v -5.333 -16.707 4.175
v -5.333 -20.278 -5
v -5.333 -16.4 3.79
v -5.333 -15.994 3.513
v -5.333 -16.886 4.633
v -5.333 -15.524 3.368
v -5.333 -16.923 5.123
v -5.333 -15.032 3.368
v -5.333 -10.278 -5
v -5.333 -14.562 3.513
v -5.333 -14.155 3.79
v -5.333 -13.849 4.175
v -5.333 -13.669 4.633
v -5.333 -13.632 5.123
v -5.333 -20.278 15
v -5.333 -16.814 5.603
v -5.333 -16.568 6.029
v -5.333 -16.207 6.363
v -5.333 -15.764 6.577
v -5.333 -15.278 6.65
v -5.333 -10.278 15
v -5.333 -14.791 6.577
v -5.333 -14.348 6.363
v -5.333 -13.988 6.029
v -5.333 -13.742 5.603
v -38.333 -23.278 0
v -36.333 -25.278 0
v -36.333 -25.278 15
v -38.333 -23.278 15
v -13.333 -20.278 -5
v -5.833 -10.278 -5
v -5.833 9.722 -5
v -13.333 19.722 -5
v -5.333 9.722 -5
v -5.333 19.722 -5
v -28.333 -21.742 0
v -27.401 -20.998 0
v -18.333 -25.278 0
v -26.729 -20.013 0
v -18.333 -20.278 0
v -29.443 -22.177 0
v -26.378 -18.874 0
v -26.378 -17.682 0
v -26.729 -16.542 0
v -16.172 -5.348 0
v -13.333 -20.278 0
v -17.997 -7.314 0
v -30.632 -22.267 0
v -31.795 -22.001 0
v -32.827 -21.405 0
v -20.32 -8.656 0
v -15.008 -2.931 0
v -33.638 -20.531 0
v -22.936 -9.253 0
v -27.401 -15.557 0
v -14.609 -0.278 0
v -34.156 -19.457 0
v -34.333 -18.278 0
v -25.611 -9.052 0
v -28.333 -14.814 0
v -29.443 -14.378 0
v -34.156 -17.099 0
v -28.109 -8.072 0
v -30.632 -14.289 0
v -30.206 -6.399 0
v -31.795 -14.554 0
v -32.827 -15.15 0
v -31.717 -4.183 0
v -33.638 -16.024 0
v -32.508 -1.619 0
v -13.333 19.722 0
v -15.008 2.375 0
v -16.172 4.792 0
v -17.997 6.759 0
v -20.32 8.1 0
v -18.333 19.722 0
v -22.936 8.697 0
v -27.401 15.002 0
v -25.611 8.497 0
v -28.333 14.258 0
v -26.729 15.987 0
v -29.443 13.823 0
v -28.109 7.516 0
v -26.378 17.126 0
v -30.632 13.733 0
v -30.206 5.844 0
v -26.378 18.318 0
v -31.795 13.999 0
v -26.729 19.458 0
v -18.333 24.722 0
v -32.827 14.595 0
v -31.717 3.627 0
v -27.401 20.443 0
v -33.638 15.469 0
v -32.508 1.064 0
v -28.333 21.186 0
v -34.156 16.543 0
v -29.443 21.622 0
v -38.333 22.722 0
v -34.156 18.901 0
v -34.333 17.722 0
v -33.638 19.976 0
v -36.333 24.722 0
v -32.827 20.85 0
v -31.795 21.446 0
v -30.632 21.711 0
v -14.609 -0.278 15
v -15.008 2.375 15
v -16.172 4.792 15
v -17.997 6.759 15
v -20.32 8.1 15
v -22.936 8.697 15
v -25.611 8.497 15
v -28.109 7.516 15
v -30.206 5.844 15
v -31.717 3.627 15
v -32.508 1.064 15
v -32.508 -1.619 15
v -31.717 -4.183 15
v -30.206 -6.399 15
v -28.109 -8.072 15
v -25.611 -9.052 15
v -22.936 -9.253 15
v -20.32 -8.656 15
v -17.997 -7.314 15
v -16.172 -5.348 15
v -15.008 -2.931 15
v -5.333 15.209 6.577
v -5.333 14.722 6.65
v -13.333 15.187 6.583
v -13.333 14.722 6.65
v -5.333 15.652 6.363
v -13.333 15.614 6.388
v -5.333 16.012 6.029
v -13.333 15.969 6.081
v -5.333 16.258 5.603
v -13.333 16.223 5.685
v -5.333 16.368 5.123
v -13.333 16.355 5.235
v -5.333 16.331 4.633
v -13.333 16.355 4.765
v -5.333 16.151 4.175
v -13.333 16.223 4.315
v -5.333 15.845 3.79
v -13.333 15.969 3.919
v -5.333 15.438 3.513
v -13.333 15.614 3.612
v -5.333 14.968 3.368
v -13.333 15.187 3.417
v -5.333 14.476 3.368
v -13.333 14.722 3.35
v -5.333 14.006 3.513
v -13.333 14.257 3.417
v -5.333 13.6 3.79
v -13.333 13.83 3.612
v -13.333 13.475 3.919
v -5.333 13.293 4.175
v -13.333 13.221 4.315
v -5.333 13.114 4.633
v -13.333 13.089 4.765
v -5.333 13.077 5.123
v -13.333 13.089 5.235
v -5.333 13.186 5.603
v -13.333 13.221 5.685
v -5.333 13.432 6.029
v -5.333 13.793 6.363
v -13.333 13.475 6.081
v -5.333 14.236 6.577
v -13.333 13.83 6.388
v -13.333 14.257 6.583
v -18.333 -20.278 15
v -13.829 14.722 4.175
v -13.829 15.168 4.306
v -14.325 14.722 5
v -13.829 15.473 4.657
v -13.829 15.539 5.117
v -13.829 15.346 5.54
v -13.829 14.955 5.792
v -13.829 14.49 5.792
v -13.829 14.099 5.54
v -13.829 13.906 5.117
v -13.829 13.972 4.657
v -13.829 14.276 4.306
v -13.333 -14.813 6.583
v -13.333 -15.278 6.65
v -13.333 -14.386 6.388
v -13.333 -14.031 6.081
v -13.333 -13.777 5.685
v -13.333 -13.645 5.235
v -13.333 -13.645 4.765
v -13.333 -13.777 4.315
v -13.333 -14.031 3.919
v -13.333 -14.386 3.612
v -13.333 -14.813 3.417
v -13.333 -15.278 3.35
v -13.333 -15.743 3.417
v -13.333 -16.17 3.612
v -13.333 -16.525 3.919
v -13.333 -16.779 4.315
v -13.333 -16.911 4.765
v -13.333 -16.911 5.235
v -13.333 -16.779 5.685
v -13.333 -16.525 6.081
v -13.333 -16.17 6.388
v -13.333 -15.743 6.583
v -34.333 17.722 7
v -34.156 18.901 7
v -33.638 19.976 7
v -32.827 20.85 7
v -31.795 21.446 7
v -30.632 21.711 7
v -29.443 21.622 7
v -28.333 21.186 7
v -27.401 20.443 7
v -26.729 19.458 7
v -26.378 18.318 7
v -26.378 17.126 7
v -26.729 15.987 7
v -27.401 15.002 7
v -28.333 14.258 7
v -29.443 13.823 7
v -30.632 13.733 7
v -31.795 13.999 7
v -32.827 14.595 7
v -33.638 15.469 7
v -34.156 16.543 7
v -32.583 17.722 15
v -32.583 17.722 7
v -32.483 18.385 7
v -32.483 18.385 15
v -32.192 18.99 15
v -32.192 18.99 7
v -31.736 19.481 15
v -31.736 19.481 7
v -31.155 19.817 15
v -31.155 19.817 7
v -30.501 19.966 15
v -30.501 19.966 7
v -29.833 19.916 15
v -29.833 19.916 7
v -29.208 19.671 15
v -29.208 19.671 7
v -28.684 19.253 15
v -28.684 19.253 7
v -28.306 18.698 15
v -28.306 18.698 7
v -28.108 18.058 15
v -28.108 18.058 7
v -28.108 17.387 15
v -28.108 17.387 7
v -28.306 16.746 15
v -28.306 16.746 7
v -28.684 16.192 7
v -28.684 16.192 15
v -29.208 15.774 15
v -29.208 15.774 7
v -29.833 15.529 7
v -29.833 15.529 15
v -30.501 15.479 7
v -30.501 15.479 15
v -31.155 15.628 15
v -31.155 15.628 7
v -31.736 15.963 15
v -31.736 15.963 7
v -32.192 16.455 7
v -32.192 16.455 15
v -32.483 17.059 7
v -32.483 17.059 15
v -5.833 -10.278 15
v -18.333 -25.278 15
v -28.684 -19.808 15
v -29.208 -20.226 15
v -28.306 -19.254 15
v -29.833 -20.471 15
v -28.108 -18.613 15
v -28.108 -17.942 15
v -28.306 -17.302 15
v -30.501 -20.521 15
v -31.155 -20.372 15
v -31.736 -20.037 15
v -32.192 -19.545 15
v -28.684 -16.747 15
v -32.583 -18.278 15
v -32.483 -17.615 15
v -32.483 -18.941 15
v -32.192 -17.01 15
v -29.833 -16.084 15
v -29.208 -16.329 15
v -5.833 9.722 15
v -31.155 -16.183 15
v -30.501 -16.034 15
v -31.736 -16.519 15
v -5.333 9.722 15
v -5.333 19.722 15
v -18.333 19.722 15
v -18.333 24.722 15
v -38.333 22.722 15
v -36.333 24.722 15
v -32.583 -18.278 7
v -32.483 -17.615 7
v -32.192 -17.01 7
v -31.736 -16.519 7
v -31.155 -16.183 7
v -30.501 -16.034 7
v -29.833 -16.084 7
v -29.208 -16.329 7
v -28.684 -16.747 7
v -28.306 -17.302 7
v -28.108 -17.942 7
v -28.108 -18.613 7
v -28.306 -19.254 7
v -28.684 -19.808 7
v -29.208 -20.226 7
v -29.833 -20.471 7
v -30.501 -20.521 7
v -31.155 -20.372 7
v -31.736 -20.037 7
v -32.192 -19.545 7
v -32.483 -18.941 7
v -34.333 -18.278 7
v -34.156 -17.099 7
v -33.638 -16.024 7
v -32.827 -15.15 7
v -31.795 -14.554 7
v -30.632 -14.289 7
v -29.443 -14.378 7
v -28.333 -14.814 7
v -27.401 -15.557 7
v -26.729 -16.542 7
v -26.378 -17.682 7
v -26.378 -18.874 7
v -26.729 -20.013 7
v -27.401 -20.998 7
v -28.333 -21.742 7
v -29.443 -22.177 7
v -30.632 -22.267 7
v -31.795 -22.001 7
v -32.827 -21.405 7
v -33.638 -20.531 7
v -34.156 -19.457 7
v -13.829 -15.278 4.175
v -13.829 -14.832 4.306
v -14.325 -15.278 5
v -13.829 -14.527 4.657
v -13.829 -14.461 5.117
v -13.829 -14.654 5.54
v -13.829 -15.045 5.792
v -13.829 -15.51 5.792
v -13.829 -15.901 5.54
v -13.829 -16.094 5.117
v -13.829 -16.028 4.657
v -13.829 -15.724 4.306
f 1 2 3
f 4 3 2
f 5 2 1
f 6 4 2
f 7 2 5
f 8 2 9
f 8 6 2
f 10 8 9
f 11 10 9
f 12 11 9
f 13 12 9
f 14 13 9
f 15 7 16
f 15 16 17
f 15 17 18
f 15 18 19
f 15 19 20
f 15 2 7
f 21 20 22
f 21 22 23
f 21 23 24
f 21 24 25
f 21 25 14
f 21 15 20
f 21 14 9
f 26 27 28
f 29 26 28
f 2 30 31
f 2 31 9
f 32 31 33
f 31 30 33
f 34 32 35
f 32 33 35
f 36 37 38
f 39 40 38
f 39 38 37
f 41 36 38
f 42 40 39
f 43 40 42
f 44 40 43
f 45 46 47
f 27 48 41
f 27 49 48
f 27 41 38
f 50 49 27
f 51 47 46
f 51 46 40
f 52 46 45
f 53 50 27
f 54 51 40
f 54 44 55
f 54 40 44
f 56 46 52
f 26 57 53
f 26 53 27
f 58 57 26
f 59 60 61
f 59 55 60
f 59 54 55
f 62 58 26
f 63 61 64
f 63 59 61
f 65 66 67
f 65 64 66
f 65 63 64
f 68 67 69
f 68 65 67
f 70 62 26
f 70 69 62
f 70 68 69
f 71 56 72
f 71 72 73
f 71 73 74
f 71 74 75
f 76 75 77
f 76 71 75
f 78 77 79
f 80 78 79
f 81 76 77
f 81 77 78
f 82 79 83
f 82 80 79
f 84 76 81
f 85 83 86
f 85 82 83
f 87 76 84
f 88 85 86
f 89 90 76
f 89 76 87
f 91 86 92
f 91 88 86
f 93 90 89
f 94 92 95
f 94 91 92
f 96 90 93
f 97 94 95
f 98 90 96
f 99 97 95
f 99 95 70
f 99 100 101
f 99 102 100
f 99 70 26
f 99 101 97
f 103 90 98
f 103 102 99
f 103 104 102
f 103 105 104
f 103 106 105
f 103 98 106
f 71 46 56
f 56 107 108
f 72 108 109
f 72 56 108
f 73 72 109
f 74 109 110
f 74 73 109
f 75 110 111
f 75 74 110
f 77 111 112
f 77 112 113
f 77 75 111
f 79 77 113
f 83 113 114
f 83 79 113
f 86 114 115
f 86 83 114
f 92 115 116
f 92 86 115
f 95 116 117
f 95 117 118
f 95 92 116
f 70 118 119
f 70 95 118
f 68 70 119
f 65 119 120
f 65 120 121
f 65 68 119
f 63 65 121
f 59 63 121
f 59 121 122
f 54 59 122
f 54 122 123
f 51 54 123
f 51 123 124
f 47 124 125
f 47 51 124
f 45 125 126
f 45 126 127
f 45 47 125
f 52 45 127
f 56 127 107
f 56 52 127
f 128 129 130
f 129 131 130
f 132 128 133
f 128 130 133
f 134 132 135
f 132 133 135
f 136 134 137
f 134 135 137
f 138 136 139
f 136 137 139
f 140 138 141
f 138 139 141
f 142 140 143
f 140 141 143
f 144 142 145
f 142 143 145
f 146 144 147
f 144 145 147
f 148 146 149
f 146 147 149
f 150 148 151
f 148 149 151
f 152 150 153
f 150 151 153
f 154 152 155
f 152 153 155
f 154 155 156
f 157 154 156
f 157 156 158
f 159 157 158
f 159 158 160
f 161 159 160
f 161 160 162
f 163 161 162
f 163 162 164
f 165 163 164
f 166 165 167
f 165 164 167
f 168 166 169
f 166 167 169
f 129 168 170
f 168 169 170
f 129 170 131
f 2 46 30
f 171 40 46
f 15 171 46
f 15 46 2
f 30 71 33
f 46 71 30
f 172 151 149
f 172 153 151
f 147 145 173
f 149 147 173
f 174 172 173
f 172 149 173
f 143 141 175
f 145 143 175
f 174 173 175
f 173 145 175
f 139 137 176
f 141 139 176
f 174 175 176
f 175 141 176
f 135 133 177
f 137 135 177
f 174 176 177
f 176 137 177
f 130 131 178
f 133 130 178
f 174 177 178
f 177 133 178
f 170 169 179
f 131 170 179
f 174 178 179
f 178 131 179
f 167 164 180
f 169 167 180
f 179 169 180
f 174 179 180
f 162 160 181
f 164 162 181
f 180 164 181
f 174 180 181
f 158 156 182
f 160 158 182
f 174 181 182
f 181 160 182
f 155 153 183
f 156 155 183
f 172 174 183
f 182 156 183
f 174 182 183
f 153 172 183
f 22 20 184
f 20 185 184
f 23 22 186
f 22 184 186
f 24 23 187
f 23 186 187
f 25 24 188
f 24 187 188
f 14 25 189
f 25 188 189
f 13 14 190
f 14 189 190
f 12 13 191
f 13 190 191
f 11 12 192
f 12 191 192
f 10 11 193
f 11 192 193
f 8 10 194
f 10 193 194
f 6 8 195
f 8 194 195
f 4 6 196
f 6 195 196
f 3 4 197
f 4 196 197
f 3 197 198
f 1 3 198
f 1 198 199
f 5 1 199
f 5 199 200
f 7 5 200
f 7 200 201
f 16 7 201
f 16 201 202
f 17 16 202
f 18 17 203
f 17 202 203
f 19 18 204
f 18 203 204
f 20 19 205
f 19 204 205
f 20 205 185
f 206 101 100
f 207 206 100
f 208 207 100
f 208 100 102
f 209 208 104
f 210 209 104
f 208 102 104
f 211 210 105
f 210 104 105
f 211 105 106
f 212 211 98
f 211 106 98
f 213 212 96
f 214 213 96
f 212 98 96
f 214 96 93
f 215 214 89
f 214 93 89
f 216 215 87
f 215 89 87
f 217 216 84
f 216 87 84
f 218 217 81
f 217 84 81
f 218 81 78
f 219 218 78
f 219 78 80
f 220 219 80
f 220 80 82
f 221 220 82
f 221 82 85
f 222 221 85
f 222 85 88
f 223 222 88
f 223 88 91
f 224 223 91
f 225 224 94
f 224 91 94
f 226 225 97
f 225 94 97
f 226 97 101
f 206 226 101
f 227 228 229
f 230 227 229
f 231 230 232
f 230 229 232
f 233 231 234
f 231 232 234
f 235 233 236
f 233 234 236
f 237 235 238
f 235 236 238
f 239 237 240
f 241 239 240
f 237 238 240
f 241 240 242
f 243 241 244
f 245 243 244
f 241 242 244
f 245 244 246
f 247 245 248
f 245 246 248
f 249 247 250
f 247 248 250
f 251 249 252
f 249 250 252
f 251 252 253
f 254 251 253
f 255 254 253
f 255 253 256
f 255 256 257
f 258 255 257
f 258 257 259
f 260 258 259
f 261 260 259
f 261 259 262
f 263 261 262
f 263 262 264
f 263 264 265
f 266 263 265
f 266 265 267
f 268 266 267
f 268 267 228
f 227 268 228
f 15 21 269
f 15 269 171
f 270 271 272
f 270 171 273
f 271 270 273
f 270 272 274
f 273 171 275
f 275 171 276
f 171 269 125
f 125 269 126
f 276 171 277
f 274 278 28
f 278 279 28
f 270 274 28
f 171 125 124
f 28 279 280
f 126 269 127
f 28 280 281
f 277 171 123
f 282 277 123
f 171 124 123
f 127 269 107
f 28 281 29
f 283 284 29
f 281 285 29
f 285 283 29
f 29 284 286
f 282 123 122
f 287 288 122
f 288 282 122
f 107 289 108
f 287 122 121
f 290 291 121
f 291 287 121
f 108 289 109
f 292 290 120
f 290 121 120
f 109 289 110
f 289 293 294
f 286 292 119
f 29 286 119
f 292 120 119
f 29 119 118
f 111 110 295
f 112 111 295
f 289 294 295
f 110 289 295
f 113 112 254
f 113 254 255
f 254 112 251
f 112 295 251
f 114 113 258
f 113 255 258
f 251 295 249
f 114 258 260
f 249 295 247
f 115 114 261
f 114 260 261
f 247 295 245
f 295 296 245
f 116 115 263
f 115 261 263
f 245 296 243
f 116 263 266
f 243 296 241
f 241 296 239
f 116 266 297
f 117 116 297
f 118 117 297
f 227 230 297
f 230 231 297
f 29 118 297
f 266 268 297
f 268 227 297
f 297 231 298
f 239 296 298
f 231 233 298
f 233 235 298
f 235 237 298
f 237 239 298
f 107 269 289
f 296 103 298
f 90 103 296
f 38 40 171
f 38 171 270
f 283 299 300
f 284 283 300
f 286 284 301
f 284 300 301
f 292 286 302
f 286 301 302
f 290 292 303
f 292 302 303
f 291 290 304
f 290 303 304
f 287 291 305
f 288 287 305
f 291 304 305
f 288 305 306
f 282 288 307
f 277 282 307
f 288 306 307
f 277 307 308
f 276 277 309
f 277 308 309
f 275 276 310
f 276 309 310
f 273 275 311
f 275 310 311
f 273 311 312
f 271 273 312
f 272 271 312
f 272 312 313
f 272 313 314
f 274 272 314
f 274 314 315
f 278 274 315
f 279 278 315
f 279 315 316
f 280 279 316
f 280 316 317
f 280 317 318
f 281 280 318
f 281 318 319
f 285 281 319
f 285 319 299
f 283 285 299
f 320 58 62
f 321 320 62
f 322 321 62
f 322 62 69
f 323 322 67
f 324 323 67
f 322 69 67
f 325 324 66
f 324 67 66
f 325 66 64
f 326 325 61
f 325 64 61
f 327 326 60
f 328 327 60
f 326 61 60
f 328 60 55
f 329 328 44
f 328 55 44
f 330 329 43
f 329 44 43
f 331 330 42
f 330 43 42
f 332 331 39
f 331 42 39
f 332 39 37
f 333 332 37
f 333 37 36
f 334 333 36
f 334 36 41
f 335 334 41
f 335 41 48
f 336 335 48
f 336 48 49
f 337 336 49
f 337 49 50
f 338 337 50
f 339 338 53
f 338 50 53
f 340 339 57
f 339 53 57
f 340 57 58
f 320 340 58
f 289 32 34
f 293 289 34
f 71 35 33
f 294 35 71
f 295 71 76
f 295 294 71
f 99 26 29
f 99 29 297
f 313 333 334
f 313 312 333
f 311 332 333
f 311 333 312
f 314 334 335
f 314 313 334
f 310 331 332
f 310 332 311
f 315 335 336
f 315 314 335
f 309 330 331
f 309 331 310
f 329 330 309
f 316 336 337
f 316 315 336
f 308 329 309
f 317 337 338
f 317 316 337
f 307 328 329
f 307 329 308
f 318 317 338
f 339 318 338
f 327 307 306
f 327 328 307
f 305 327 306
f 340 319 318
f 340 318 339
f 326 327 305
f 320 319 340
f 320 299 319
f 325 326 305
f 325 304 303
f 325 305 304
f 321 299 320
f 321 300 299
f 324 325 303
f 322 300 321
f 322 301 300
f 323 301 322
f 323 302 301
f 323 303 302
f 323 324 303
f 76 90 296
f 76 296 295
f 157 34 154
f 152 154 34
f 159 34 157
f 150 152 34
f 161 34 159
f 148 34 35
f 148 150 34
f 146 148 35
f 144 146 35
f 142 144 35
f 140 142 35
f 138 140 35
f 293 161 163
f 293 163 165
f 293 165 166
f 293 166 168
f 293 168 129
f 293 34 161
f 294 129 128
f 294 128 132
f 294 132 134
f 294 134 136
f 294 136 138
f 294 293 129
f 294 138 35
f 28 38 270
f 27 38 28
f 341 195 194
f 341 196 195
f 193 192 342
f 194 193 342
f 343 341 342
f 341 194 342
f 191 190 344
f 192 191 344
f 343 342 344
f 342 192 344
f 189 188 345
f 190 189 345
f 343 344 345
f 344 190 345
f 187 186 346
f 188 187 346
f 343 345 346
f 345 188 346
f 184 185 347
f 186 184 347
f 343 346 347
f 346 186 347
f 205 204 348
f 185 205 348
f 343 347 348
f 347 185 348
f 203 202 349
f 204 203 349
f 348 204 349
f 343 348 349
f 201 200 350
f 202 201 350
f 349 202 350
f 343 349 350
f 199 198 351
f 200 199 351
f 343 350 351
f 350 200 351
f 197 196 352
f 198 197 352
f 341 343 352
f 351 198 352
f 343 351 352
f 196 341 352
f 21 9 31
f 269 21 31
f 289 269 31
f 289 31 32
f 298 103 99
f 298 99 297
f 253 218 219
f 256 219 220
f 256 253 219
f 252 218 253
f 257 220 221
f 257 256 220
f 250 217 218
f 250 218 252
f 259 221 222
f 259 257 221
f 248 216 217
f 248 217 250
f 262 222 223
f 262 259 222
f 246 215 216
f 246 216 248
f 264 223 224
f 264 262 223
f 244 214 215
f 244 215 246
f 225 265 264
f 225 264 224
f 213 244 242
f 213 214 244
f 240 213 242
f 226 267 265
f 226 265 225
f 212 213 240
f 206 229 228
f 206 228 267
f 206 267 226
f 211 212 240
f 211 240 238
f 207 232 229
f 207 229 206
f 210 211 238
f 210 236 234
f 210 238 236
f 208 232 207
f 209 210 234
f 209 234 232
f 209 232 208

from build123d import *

# Parameters (mm, degrees)
SKETCH4_R             = 9
BOSS_EXTRUDE1_DEPTH   = 15
SKETCH5_R             = 4
CUT_EXTRUDE1_DEPTH    = 7
SKETCH6_R             = 2.25
CUT_EXTRUDE2_DEPTH    = 9
BOSS_EXTRUDE3_DEPTH   = 5
CHAMFER1_SIZE         = 2
M4_TAPPED_HOLE1_D     = 3.3
M4_TAPPED_HOLE1_DEPTH = 8
M4_TAPPED_HOLE1_TIP   = 0.991420021


with BuildPart() as part:
    # Sketch4 → Boss-Extrude1 (new body)
    with BuildSketch(Plane.XY):
        Polygon((-38.333333333, -25.277777778), (-38.333333333, 24.722222222), (-18.333333333, 24.722222222), (-18.333333333, 19.722222222), (-5.333333333, 19.722222222), (-5.333333333, 9.722222222), (-5.833333333, 9.722222222), (-5.833333333, -10.277777778), (-5.333333333, -10.277777778), (-5.333333333, -20.277777778), (-18.333333333, -20.277777778), (-18.333333333, -25.277777778), align=None)
        with Locations((-23.608519649, -0.277777778)):
            Circle(SKETCH4_R, mode=Mode.SUBTRACT)
    extrude(amount=BOSS_EXTRUDE1_DEPTH)

    # Sketch5 → Cut-Extrude1 (cut)
    with BuildSketch(Plane(origin=(0, 0, 0), x_dir=(-1, 0, 0), z_dir=(0, 0, -1))):
        with Locations((30.333333333, 17.722222222)):
            Circle(SKETCH5_R)
        with Locations((30.333333333, -18.277777778)):
            Circle(SKETCH5_R)
    extrude(amount=-CUT_EXTRUDE1_DEPTH, mode=Mode.SUBTRACT)

    # Sketch6 → Cut-Extrude2 (cut, through all)
    with BuildSketch(Plane(origin=(0, 0, 7), x_dir=(-1, 0, 0), z_dir=(0, 0, -1))):
        with Locations((30.333333333, 17.722222222)):
            Circle(SKETCH6_R)
        with Locations((30.333333333, -18.277777778)):
            Circle(SKETCH6_R)
    extrude(amount=-CUT_EXTRUDE2_DEPTH, mode=Mode.SUBTRACT)

    # Sketch9 → Boss-Extrude3 (add)
    with BuildSketch(Plane(origin=(0, 0, 0), x_dir=(-1, 0, 0), z_dir=(0, 0, -1))):
        Polygon((13.333333333, -20.277777778), (5.333333333, -20.277777778), (5.333333333, -10.277777778), (5.833333333, -10.277777778), (5.833333333, 9.722222222), (5.333333333, 9.722222222), (5.333333333, 19.722222222), (13.333333333, 19.722222222), align=None)
    extrude(amount=BOSS_EXTRUDE3_DEPTH)

    # Chamfer1
    chamfer1_edges = [part.edges().sort_by_distance(p)[0] for p in [
        (-38.333333333, -25.277777778, 7.5),
        (-38.333333333, 24.722222222, 7.5),
    ]]
    chamfer(chamfer1_edges, length=CHAMFER1_SIZE)

    # M4 Tapped Hole1
    with Locations(Plane(origin=(-5.333333333, 0, 0), x_dir=(0, 0, -1), z_dir=(1, 0, 0))):
        with Locations((-5, 14.722222222), (-5, -15.277777778)):
            Hole(M4_TAPPED_HOLE1_D / 2, depth=M4_TAPPED_HOLE1_DEPTH)
            with Locations((0, 0, -(M4_TAPPED_HOLE1_DEPTH + M4_TAPPED_HOLE1_TIP / 2))):  # 118° drill point
                Cone(0, M4_TAPPED_HOLE1_D / 2, M4_TAPPED_HOLE1_TIP, mode=Mode.SUBTRACT)


solid = part.part
